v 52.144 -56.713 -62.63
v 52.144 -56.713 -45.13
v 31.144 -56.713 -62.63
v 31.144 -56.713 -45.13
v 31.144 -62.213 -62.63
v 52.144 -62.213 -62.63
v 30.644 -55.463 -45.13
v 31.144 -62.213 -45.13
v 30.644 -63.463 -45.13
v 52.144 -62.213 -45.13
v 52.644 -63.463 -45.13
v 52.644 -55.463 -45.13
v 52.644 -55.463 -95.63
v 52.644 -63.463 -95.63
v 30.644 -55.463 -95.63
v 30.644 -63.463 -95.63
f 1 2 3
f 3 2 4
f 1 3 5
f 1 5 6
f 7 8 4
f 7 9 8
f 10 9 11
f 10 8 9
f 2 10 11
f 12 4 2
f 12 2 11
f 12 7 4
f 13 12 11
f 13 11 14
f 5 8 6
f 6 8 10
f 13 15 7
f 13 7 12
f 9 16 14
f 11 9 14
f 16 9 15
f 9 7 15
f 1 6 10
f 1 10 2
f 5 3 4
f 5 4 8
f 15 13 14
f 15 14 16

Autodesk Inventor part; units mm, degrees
ref_plane "YZ Plane" through (0, 0, 0) normal (1, 0, 0) x (0, 1, 0)
ref_plane "XZ Plane" through (0, 0, 0) normal (0, 1, 0) x (-1, 0, 0)
ref_plane "XY Plane" through (0, 0, 0) normal (0, 0, 1) x (1, 0, 0)
ref_plane "Arbeitsebene1" through (41.6445, -55.4632, -27.5498) normal (0, -1, 0) x (1, 0, 0)
sketch "Skizze1" plane through (41.6445, -55.4632, -27.5498) normal (0, -1, 0) x (1, 0, 0)
  line L0 (0, -17.58) -> (11, -17.58)
  line L1 (11, -17.58) -> (11, -68.08)
  line L2 (11, -68.08) -> (0, -68.08)
  line L3 (0, -68.08) -> (0, -17.58)
  line L4 (-20.1267, -68.08) -> (20.1267, -68.08) projected
  line L5 (0, 101.8556) -> (0, -98.0191)
  line L6 (0, -17.58) -> (-11, -17.58)
  line L7 (-11, -17.58) -> (-11, -68.08)
  line L8 (-11, -68.08) -> (0, -68.08)
  point P0 (-41.6445, 27.5498)
  dimension "d0" = 11
  dimension "d1" = 50.5
extrude "Extrusion1" add sketch "Skizze1" along normal blind 8
sketch "Skizze2" plane through (30.6445, -55.4632, -45.1298) normal (0, 0, 1) x (1, 0, 0)
  line L0 (22, 0) -> (0, 0) projected
  line L1 (0, 0) -> (0, -8) projected
  line L2 (22, -8) -> (0, -8) projected
  line L3 (22, 0) -> (22, -8) projected
  line L4 (21.5, -1.25) -> (0.5, -1.25)
  line L5 (0.5, -1.25) -> (0.5, -6.75)
  line L6 (0.5, -6.75) -> (21.5, -6.75)
  line L7 (21.5, -6.75) -> (21.5, -1.25)
  line L8 (21.5, -1.25) -> (0.5, -6.75) construction
  line L9 (0.5, -1.25) -> (21.5, -6.75) construction
  point P0 (-30.6445, 55.4632)
  point P1 (11, -4)
  dimension "d4" = 21
  dimension "d5" = 5.5
extrude "Extrusion2" cut sketch "Skizze2" against normal blind 17.5 contours L7 L6 L5 L4
properties part number "Außenhülle"
